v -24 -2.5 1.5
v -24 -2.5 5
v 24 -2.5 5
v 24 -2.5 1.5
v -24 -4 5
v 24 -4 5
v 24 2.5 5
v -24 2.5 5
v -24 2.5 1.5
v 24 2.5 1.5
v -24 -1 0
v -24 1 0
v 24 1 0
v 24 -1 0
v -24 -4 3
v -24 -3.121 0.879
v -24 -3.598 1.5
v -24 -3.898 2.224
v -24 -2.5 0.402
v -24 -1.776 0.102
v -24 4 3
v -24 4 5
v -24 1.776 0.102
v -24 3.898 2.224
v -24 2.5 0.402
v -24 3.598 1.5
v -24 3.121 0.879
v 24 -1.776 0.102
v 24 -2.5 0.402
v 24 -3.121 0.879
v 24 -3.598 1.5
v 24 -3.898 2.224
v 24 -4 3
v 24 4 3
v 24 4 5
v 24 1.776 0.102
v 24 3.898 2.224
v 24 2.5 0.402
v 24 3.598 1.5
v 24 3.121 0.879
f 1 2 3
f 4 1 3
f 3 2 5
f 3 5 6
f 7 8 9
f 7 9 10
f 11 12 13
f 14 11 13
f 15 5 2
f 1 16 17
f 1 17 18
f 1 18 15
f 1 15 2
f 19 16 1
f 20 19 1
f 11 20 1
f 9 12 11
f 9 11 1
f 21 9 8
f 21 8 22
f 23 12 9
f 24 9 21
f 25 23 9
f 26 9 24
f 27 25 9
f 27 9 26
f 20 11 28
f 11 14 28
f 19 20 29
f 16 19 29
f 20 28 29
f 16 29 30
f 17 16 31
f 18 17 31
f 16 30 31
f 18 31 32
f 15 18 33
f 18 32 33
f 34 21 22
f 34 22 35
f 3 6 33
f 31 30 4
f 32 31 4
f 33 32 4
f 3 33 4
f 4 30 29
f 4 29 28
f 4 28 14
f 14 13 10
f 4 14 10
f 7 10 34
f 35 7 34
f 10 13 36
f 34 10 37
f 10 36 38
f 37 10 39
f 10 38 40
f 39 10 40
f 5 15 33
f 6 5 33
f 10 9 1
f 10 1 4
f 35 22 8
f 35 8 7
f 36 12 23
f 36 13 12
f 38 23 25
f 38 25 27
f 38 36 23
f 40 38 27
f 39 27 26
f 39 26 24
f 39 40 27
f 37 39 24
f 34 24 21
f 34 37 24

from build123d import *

# Parameters (mm, degrees)
F0_W     = 48
F0_H     = 8
F1_DEPTH = 5
F2_W     = 48
F2_H     = 5
F3_DEPTH = 3.5
F4_R     = 3


with BuildPart() as f1:
    # F0 (on Top) → F1 (new body)
    with BuildSketch(Plane.XY):
        Rectangle(F0_W, F0_H)
    extrude(amount=F1_DEPTH)

    # F2 (on face) → F3 (cut)
    with BuildSketch(Plane.XY.offset(5)):
        Rectangle(F2_W, F2_H)
    extrude(amount=-F3_DEPTH, mode=Mode.SUBTRACT)

    # F4
    f4_edges = [f1.edges().sort_by_distance(p)[0] for p in [
        (0, -4, 0),
        (0, 4, 0),
    ]]
    fillet(f4_edges, radius=F4_R)


solid = f1.part
